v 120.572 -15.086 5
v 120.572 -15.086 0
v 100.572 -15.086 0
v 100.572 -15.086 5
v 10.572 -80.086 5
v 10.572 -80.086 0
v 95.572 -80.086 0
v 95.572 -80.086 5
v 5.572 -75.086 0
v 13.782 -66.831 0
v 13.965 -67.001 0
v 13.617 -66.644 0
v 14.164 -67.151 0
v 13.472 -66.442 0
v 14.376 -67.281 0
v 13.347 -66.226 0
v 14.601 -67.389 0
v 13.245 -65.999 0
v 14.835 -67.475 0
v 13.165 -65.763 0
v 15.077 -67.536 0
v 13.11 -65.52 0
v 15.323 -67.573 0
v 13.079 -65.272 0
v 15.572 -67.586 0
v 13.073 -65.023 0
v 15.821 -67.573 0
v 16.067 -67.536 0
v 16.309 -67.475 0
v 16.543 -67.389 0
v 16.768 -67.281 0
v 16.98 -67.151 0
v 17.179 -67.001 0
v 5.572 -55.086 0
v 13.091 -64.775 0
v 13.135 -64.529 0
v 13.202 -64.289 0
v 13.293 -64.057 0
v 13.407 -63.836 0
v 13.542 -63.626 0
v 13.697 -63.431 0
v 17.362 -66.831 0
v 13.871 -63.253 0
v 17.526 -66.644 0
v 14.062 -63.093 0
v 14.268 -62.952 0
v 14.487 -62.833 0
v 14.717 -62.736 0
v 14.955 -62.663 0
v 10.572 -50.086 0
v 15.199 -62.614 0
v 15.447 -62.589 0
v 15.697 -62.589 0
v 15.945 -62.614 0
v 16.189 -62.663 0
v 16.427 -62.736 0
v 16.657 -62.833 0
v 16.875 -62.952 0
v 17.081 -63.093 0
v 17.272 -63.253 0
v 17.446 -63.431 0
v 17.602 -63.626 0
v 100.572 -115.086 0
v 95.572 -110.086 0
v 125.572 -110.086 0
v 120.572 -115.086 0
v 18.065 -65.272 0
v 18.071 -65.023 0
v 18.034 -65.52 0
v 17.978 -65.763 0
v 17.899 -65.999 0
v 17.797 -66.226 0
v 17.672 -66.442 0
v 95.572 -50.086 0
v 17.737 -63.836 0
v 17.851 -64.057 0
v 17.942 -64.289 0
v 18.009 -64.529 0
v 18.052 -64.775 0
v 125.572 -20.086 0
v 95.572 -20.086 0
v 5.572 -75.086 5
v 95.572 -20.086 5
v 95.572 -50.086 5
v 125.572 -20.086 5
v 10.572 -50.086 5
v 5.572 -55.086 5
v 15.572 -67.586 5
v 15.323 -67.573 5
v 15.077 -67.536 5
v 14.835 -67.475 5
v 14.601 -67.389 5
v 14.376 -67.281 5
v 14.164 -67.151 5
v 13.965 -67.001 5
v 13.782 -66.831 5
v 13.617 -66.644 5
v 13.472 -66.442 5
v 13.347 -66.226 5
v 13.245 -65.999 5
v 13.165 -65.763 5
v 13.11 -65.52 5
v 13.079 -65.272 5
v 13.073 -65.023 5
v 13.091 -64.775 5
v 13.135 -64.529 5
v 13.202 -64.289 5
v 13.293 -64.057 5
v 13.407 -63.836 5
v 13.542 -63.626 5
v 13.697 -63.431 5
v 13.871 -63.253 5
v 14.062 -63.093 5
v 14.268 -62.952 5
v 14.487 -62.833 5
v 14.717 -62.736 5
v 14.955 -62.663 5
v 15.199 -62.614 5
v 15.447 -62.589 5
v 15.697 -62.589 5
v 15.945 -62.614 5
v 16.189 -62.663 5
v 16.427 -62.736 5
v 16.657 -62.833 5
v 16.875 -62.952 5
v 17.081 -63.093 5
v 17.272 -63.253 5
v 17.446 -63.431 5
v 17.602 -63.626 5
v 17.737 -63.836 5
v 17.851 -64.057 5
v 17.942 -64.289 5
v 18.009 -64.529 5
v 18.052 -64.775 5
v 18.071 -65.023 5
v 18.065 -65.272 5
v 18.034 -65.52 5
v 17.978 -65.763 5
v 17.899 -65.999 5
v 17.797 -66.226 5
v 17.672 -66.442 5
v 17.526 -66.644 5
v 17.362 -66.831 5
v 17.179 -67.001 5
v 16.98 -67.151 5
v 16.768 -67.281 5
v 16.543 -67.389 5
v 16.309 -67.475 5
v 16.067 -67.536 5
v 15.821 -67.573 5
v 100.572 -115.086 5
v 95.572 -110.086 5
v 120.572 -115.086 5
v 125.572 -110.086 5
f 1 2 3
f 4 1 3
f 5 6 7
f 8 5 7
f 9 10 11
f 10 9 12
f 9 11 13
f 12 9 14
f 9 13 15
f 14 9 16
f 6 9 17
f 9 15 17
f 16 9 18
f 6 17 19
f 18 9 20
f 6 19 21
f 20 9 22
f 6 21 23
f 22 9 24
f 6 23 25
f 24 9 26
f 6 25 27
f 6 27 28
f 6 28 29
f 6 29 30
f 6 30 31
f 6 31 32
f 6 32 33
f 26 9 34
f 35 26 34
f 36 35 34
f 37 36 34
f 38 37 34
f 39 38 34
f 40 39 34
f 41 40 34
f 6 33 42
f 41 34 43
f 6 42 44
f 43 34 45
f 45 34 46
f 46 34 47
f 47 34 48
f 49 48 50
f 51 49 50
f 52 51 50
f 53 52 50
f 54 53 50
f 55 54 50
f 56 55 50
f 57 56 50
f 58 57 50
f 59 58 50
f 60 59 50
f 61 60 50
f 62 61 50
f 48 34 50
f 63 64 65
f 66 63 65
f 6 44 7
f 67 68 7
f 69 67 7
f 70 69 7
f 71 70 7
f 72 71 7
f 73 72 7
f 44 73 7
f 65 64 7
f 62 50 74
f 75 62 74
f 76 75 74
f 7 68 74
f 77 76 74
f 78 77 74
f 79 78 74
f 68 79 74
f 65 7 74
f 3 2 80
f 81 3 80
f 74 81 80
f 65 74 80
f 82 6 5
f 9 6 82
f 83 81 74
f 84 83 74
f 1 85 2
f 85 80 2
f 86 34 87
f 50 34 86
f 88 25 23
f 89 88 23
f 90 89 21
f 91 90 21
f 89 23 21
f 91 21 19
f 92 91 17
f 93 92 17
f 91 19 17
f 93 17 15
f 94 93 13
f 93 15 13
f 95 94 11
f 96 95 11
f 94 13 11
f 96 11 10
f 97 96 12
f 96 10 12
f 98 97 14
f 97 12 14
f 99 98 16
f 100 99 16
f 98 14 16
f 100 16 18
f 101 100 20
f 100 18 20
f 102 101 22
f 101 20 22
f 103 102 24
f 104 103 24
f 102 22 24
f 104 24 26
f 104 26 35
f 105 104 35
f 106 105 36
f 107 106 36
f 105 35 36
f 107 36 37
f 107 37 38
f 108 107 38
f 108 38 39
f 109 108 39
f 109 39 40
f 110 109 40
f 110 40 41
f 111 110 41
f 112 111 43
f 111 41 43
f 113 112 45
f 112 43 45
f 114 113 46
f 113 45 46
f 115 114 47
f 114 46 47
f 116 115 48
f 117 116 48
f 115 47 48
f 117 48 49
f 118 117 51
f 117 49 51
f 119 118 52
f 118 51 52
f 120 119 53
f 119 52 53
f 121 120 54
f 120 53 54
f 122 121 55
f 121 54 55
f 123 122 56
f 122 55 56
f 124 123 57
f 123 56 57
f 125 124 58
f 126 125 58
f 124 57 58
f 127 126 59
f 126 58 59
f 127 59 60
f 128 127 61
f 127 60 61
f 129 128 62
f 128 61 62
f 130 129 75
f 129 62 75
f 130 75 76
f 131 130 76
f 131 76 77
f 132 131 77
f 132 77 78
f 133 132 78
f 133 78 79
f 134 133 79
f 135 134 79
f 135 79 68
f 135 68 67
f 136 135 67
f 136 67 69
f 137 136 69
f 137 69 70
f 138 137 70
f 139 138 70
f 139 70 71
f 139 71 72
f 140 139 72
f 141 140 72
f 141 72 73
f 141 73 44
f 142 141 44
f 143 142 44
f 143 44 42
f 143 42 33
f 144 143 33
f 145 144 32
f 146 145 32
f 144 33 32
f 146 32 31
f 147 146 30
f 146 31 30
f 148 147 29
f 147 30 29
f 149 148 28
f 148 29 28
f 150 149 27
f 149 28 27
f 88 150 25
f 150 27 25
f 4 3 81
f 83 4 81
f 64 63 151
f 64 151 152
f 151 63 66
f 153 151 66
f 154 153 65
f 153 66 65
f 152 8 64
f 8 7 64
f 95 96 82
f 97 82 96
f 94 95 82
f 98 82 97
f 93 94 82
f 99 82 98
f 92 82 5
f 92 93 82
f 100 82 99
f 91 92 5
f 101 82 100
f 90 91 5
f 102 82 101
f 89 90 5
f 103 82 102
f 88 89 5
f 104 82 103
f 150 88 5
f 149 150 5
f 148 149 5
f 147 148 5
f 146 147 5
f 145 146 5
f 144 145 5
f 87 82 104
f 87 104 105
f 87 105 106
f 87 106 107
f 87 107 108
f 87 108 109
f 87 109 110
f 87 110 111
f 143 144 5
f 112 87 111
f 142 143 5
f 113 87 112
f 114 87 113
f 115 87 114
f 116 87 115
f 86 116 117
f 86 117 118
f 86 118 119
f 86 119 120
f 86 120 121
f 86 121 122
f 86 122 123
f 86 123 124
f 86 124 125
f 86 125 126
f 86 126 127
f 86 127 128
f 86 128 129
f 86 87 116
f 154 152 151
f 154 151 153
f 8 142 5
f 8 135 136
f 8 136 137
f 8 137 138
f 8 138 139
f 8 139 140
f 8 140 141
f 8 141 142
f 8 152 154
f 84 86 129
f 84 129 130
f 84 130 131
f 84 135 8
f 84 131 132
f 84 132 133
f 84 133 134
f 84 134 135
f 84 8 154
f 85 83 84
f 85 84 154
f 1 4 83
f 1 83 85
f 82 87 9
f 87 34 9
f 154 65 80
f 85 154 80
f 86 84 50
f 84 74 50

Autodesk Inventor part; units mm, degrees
ref_plane "YZ Plane" through (0, 0, 0) normal (1, 0, 0) x (0, 1, 0)
ref_plane "XZ Plane" through (0, 0, 0) normal (0, 1, 0) x (-1, 0, 0)
ref_plane "XY Plane" through (0, 0, 0) normal (0, 0, 1) x (1, 0, 0)
sketch "Sketch1" plane through (0, 0, 0) normal (0, 0, 1) x (1, 0, 0)
  line L0 (120.5719, -15.0856) -> (100.5719, -15.0856)
  line L1 (100.5719, -115.0856) -> (120.5719, -115.0856)
  line L2 (125.5719, -110.0856) -> (125.5719, -20.0856)
  line L3 (95.5719, -50.0856) -> (10.5719, -50.0856)
  line L4 (5.5719, -55.0856) -> (5.5719, -75.0856)
  line L5 (10.5719, -80.0856) -> (95.5719, -80.0856)
  line L6 (95.5719, -20.0856) -> (95.5719, -50.0856)
  line L7 (95.5719, -80.0856) -> (95.5719, -110.0856)
  line L8 (125.5719, -65.0856) -> (5.5719, -65.0856) construction
  line L9 (125.5719, -20.0856) -> (120.5719, -15.0856)
  line L10 (100.5719, -15.0856) -> (95.5719, -20.0856)
  line L11 (120.5719, -115.0856) -> (125.5719, -110.0856)
  line L12 (100.5719, -115.0856) -> (95.5719, -110.0856)
  line L13 (10.5719, -80.0856) -> (5.5719, -75.0856)
  line L14 (5.5719, -55.0856) -> (10.5719, -50.0856)
  point P0 (0, 0)
  point P1 (125.5719, -15.0856)
  point P2 (95.5719, -115.0856)
  point P3 (95.5719, -15.0856)
  point P4 (125.5719, -115.0856)
  point P5 (5.5719, -80.0856)
  point P6 (5.5719, -50.0856)
  point P7 (15.5719, -65.0856)
  dimension "d0" = 30
  dimension "d3" = 30
  dimension "d4" = 100
  dimension "d5" = 5
  dimension "d6" = 5
  dimension "d7" = 5
  dimension "d8" = 5
  dimension "d9" = 5
  dimension "d10" = 5
  dimension "d11" = 5
  dimension "d12" = 5
  dimension "d13" = 5
  dimension "d14" = 5
  dimension "d15" = 5
  dimension "d16" = 5
  dimension "d33" = 10
  dimension "d37" = 90
extrude "Extrusion1" add sketch "Sketch1" along normal blind 5
sketch "Sketch2" plane through (0, 0, 5) normal (0, 0, 1) x (1, 0, 0)
  line L0 (5.5719, -55.0856) -> (5.5719, -75.0856) projected
  line L1 (10.5719, -80.0856) -> (95.5719, -80.0856) projected
  point P0 (0, 0)
  point P1 (15.5719, -65.0856)
  dimension "d19" = 10
  dimension "d27" = 15
hole "Hole1" at (15.5719, -65.0856, 5) direction (0, 0, -1) diameter 5 end through all
equation "\"d6\" = d5"
equation "\"d7\" = d5"
equation "\"d8\" = d7"
equation "\"d9\" = d5"
equation "\"d10\" = d9"
equation "\"d11\" = d5"
equation "\"d12\" = d11"
equation "\"d13\" = d5"
equation "\"d14\" = d13"
equation "\"d15\" = d5"
equation "\"d16\" = d15"
properties part number "PistonV2" material "MDF Medium Density Fiberboard"
